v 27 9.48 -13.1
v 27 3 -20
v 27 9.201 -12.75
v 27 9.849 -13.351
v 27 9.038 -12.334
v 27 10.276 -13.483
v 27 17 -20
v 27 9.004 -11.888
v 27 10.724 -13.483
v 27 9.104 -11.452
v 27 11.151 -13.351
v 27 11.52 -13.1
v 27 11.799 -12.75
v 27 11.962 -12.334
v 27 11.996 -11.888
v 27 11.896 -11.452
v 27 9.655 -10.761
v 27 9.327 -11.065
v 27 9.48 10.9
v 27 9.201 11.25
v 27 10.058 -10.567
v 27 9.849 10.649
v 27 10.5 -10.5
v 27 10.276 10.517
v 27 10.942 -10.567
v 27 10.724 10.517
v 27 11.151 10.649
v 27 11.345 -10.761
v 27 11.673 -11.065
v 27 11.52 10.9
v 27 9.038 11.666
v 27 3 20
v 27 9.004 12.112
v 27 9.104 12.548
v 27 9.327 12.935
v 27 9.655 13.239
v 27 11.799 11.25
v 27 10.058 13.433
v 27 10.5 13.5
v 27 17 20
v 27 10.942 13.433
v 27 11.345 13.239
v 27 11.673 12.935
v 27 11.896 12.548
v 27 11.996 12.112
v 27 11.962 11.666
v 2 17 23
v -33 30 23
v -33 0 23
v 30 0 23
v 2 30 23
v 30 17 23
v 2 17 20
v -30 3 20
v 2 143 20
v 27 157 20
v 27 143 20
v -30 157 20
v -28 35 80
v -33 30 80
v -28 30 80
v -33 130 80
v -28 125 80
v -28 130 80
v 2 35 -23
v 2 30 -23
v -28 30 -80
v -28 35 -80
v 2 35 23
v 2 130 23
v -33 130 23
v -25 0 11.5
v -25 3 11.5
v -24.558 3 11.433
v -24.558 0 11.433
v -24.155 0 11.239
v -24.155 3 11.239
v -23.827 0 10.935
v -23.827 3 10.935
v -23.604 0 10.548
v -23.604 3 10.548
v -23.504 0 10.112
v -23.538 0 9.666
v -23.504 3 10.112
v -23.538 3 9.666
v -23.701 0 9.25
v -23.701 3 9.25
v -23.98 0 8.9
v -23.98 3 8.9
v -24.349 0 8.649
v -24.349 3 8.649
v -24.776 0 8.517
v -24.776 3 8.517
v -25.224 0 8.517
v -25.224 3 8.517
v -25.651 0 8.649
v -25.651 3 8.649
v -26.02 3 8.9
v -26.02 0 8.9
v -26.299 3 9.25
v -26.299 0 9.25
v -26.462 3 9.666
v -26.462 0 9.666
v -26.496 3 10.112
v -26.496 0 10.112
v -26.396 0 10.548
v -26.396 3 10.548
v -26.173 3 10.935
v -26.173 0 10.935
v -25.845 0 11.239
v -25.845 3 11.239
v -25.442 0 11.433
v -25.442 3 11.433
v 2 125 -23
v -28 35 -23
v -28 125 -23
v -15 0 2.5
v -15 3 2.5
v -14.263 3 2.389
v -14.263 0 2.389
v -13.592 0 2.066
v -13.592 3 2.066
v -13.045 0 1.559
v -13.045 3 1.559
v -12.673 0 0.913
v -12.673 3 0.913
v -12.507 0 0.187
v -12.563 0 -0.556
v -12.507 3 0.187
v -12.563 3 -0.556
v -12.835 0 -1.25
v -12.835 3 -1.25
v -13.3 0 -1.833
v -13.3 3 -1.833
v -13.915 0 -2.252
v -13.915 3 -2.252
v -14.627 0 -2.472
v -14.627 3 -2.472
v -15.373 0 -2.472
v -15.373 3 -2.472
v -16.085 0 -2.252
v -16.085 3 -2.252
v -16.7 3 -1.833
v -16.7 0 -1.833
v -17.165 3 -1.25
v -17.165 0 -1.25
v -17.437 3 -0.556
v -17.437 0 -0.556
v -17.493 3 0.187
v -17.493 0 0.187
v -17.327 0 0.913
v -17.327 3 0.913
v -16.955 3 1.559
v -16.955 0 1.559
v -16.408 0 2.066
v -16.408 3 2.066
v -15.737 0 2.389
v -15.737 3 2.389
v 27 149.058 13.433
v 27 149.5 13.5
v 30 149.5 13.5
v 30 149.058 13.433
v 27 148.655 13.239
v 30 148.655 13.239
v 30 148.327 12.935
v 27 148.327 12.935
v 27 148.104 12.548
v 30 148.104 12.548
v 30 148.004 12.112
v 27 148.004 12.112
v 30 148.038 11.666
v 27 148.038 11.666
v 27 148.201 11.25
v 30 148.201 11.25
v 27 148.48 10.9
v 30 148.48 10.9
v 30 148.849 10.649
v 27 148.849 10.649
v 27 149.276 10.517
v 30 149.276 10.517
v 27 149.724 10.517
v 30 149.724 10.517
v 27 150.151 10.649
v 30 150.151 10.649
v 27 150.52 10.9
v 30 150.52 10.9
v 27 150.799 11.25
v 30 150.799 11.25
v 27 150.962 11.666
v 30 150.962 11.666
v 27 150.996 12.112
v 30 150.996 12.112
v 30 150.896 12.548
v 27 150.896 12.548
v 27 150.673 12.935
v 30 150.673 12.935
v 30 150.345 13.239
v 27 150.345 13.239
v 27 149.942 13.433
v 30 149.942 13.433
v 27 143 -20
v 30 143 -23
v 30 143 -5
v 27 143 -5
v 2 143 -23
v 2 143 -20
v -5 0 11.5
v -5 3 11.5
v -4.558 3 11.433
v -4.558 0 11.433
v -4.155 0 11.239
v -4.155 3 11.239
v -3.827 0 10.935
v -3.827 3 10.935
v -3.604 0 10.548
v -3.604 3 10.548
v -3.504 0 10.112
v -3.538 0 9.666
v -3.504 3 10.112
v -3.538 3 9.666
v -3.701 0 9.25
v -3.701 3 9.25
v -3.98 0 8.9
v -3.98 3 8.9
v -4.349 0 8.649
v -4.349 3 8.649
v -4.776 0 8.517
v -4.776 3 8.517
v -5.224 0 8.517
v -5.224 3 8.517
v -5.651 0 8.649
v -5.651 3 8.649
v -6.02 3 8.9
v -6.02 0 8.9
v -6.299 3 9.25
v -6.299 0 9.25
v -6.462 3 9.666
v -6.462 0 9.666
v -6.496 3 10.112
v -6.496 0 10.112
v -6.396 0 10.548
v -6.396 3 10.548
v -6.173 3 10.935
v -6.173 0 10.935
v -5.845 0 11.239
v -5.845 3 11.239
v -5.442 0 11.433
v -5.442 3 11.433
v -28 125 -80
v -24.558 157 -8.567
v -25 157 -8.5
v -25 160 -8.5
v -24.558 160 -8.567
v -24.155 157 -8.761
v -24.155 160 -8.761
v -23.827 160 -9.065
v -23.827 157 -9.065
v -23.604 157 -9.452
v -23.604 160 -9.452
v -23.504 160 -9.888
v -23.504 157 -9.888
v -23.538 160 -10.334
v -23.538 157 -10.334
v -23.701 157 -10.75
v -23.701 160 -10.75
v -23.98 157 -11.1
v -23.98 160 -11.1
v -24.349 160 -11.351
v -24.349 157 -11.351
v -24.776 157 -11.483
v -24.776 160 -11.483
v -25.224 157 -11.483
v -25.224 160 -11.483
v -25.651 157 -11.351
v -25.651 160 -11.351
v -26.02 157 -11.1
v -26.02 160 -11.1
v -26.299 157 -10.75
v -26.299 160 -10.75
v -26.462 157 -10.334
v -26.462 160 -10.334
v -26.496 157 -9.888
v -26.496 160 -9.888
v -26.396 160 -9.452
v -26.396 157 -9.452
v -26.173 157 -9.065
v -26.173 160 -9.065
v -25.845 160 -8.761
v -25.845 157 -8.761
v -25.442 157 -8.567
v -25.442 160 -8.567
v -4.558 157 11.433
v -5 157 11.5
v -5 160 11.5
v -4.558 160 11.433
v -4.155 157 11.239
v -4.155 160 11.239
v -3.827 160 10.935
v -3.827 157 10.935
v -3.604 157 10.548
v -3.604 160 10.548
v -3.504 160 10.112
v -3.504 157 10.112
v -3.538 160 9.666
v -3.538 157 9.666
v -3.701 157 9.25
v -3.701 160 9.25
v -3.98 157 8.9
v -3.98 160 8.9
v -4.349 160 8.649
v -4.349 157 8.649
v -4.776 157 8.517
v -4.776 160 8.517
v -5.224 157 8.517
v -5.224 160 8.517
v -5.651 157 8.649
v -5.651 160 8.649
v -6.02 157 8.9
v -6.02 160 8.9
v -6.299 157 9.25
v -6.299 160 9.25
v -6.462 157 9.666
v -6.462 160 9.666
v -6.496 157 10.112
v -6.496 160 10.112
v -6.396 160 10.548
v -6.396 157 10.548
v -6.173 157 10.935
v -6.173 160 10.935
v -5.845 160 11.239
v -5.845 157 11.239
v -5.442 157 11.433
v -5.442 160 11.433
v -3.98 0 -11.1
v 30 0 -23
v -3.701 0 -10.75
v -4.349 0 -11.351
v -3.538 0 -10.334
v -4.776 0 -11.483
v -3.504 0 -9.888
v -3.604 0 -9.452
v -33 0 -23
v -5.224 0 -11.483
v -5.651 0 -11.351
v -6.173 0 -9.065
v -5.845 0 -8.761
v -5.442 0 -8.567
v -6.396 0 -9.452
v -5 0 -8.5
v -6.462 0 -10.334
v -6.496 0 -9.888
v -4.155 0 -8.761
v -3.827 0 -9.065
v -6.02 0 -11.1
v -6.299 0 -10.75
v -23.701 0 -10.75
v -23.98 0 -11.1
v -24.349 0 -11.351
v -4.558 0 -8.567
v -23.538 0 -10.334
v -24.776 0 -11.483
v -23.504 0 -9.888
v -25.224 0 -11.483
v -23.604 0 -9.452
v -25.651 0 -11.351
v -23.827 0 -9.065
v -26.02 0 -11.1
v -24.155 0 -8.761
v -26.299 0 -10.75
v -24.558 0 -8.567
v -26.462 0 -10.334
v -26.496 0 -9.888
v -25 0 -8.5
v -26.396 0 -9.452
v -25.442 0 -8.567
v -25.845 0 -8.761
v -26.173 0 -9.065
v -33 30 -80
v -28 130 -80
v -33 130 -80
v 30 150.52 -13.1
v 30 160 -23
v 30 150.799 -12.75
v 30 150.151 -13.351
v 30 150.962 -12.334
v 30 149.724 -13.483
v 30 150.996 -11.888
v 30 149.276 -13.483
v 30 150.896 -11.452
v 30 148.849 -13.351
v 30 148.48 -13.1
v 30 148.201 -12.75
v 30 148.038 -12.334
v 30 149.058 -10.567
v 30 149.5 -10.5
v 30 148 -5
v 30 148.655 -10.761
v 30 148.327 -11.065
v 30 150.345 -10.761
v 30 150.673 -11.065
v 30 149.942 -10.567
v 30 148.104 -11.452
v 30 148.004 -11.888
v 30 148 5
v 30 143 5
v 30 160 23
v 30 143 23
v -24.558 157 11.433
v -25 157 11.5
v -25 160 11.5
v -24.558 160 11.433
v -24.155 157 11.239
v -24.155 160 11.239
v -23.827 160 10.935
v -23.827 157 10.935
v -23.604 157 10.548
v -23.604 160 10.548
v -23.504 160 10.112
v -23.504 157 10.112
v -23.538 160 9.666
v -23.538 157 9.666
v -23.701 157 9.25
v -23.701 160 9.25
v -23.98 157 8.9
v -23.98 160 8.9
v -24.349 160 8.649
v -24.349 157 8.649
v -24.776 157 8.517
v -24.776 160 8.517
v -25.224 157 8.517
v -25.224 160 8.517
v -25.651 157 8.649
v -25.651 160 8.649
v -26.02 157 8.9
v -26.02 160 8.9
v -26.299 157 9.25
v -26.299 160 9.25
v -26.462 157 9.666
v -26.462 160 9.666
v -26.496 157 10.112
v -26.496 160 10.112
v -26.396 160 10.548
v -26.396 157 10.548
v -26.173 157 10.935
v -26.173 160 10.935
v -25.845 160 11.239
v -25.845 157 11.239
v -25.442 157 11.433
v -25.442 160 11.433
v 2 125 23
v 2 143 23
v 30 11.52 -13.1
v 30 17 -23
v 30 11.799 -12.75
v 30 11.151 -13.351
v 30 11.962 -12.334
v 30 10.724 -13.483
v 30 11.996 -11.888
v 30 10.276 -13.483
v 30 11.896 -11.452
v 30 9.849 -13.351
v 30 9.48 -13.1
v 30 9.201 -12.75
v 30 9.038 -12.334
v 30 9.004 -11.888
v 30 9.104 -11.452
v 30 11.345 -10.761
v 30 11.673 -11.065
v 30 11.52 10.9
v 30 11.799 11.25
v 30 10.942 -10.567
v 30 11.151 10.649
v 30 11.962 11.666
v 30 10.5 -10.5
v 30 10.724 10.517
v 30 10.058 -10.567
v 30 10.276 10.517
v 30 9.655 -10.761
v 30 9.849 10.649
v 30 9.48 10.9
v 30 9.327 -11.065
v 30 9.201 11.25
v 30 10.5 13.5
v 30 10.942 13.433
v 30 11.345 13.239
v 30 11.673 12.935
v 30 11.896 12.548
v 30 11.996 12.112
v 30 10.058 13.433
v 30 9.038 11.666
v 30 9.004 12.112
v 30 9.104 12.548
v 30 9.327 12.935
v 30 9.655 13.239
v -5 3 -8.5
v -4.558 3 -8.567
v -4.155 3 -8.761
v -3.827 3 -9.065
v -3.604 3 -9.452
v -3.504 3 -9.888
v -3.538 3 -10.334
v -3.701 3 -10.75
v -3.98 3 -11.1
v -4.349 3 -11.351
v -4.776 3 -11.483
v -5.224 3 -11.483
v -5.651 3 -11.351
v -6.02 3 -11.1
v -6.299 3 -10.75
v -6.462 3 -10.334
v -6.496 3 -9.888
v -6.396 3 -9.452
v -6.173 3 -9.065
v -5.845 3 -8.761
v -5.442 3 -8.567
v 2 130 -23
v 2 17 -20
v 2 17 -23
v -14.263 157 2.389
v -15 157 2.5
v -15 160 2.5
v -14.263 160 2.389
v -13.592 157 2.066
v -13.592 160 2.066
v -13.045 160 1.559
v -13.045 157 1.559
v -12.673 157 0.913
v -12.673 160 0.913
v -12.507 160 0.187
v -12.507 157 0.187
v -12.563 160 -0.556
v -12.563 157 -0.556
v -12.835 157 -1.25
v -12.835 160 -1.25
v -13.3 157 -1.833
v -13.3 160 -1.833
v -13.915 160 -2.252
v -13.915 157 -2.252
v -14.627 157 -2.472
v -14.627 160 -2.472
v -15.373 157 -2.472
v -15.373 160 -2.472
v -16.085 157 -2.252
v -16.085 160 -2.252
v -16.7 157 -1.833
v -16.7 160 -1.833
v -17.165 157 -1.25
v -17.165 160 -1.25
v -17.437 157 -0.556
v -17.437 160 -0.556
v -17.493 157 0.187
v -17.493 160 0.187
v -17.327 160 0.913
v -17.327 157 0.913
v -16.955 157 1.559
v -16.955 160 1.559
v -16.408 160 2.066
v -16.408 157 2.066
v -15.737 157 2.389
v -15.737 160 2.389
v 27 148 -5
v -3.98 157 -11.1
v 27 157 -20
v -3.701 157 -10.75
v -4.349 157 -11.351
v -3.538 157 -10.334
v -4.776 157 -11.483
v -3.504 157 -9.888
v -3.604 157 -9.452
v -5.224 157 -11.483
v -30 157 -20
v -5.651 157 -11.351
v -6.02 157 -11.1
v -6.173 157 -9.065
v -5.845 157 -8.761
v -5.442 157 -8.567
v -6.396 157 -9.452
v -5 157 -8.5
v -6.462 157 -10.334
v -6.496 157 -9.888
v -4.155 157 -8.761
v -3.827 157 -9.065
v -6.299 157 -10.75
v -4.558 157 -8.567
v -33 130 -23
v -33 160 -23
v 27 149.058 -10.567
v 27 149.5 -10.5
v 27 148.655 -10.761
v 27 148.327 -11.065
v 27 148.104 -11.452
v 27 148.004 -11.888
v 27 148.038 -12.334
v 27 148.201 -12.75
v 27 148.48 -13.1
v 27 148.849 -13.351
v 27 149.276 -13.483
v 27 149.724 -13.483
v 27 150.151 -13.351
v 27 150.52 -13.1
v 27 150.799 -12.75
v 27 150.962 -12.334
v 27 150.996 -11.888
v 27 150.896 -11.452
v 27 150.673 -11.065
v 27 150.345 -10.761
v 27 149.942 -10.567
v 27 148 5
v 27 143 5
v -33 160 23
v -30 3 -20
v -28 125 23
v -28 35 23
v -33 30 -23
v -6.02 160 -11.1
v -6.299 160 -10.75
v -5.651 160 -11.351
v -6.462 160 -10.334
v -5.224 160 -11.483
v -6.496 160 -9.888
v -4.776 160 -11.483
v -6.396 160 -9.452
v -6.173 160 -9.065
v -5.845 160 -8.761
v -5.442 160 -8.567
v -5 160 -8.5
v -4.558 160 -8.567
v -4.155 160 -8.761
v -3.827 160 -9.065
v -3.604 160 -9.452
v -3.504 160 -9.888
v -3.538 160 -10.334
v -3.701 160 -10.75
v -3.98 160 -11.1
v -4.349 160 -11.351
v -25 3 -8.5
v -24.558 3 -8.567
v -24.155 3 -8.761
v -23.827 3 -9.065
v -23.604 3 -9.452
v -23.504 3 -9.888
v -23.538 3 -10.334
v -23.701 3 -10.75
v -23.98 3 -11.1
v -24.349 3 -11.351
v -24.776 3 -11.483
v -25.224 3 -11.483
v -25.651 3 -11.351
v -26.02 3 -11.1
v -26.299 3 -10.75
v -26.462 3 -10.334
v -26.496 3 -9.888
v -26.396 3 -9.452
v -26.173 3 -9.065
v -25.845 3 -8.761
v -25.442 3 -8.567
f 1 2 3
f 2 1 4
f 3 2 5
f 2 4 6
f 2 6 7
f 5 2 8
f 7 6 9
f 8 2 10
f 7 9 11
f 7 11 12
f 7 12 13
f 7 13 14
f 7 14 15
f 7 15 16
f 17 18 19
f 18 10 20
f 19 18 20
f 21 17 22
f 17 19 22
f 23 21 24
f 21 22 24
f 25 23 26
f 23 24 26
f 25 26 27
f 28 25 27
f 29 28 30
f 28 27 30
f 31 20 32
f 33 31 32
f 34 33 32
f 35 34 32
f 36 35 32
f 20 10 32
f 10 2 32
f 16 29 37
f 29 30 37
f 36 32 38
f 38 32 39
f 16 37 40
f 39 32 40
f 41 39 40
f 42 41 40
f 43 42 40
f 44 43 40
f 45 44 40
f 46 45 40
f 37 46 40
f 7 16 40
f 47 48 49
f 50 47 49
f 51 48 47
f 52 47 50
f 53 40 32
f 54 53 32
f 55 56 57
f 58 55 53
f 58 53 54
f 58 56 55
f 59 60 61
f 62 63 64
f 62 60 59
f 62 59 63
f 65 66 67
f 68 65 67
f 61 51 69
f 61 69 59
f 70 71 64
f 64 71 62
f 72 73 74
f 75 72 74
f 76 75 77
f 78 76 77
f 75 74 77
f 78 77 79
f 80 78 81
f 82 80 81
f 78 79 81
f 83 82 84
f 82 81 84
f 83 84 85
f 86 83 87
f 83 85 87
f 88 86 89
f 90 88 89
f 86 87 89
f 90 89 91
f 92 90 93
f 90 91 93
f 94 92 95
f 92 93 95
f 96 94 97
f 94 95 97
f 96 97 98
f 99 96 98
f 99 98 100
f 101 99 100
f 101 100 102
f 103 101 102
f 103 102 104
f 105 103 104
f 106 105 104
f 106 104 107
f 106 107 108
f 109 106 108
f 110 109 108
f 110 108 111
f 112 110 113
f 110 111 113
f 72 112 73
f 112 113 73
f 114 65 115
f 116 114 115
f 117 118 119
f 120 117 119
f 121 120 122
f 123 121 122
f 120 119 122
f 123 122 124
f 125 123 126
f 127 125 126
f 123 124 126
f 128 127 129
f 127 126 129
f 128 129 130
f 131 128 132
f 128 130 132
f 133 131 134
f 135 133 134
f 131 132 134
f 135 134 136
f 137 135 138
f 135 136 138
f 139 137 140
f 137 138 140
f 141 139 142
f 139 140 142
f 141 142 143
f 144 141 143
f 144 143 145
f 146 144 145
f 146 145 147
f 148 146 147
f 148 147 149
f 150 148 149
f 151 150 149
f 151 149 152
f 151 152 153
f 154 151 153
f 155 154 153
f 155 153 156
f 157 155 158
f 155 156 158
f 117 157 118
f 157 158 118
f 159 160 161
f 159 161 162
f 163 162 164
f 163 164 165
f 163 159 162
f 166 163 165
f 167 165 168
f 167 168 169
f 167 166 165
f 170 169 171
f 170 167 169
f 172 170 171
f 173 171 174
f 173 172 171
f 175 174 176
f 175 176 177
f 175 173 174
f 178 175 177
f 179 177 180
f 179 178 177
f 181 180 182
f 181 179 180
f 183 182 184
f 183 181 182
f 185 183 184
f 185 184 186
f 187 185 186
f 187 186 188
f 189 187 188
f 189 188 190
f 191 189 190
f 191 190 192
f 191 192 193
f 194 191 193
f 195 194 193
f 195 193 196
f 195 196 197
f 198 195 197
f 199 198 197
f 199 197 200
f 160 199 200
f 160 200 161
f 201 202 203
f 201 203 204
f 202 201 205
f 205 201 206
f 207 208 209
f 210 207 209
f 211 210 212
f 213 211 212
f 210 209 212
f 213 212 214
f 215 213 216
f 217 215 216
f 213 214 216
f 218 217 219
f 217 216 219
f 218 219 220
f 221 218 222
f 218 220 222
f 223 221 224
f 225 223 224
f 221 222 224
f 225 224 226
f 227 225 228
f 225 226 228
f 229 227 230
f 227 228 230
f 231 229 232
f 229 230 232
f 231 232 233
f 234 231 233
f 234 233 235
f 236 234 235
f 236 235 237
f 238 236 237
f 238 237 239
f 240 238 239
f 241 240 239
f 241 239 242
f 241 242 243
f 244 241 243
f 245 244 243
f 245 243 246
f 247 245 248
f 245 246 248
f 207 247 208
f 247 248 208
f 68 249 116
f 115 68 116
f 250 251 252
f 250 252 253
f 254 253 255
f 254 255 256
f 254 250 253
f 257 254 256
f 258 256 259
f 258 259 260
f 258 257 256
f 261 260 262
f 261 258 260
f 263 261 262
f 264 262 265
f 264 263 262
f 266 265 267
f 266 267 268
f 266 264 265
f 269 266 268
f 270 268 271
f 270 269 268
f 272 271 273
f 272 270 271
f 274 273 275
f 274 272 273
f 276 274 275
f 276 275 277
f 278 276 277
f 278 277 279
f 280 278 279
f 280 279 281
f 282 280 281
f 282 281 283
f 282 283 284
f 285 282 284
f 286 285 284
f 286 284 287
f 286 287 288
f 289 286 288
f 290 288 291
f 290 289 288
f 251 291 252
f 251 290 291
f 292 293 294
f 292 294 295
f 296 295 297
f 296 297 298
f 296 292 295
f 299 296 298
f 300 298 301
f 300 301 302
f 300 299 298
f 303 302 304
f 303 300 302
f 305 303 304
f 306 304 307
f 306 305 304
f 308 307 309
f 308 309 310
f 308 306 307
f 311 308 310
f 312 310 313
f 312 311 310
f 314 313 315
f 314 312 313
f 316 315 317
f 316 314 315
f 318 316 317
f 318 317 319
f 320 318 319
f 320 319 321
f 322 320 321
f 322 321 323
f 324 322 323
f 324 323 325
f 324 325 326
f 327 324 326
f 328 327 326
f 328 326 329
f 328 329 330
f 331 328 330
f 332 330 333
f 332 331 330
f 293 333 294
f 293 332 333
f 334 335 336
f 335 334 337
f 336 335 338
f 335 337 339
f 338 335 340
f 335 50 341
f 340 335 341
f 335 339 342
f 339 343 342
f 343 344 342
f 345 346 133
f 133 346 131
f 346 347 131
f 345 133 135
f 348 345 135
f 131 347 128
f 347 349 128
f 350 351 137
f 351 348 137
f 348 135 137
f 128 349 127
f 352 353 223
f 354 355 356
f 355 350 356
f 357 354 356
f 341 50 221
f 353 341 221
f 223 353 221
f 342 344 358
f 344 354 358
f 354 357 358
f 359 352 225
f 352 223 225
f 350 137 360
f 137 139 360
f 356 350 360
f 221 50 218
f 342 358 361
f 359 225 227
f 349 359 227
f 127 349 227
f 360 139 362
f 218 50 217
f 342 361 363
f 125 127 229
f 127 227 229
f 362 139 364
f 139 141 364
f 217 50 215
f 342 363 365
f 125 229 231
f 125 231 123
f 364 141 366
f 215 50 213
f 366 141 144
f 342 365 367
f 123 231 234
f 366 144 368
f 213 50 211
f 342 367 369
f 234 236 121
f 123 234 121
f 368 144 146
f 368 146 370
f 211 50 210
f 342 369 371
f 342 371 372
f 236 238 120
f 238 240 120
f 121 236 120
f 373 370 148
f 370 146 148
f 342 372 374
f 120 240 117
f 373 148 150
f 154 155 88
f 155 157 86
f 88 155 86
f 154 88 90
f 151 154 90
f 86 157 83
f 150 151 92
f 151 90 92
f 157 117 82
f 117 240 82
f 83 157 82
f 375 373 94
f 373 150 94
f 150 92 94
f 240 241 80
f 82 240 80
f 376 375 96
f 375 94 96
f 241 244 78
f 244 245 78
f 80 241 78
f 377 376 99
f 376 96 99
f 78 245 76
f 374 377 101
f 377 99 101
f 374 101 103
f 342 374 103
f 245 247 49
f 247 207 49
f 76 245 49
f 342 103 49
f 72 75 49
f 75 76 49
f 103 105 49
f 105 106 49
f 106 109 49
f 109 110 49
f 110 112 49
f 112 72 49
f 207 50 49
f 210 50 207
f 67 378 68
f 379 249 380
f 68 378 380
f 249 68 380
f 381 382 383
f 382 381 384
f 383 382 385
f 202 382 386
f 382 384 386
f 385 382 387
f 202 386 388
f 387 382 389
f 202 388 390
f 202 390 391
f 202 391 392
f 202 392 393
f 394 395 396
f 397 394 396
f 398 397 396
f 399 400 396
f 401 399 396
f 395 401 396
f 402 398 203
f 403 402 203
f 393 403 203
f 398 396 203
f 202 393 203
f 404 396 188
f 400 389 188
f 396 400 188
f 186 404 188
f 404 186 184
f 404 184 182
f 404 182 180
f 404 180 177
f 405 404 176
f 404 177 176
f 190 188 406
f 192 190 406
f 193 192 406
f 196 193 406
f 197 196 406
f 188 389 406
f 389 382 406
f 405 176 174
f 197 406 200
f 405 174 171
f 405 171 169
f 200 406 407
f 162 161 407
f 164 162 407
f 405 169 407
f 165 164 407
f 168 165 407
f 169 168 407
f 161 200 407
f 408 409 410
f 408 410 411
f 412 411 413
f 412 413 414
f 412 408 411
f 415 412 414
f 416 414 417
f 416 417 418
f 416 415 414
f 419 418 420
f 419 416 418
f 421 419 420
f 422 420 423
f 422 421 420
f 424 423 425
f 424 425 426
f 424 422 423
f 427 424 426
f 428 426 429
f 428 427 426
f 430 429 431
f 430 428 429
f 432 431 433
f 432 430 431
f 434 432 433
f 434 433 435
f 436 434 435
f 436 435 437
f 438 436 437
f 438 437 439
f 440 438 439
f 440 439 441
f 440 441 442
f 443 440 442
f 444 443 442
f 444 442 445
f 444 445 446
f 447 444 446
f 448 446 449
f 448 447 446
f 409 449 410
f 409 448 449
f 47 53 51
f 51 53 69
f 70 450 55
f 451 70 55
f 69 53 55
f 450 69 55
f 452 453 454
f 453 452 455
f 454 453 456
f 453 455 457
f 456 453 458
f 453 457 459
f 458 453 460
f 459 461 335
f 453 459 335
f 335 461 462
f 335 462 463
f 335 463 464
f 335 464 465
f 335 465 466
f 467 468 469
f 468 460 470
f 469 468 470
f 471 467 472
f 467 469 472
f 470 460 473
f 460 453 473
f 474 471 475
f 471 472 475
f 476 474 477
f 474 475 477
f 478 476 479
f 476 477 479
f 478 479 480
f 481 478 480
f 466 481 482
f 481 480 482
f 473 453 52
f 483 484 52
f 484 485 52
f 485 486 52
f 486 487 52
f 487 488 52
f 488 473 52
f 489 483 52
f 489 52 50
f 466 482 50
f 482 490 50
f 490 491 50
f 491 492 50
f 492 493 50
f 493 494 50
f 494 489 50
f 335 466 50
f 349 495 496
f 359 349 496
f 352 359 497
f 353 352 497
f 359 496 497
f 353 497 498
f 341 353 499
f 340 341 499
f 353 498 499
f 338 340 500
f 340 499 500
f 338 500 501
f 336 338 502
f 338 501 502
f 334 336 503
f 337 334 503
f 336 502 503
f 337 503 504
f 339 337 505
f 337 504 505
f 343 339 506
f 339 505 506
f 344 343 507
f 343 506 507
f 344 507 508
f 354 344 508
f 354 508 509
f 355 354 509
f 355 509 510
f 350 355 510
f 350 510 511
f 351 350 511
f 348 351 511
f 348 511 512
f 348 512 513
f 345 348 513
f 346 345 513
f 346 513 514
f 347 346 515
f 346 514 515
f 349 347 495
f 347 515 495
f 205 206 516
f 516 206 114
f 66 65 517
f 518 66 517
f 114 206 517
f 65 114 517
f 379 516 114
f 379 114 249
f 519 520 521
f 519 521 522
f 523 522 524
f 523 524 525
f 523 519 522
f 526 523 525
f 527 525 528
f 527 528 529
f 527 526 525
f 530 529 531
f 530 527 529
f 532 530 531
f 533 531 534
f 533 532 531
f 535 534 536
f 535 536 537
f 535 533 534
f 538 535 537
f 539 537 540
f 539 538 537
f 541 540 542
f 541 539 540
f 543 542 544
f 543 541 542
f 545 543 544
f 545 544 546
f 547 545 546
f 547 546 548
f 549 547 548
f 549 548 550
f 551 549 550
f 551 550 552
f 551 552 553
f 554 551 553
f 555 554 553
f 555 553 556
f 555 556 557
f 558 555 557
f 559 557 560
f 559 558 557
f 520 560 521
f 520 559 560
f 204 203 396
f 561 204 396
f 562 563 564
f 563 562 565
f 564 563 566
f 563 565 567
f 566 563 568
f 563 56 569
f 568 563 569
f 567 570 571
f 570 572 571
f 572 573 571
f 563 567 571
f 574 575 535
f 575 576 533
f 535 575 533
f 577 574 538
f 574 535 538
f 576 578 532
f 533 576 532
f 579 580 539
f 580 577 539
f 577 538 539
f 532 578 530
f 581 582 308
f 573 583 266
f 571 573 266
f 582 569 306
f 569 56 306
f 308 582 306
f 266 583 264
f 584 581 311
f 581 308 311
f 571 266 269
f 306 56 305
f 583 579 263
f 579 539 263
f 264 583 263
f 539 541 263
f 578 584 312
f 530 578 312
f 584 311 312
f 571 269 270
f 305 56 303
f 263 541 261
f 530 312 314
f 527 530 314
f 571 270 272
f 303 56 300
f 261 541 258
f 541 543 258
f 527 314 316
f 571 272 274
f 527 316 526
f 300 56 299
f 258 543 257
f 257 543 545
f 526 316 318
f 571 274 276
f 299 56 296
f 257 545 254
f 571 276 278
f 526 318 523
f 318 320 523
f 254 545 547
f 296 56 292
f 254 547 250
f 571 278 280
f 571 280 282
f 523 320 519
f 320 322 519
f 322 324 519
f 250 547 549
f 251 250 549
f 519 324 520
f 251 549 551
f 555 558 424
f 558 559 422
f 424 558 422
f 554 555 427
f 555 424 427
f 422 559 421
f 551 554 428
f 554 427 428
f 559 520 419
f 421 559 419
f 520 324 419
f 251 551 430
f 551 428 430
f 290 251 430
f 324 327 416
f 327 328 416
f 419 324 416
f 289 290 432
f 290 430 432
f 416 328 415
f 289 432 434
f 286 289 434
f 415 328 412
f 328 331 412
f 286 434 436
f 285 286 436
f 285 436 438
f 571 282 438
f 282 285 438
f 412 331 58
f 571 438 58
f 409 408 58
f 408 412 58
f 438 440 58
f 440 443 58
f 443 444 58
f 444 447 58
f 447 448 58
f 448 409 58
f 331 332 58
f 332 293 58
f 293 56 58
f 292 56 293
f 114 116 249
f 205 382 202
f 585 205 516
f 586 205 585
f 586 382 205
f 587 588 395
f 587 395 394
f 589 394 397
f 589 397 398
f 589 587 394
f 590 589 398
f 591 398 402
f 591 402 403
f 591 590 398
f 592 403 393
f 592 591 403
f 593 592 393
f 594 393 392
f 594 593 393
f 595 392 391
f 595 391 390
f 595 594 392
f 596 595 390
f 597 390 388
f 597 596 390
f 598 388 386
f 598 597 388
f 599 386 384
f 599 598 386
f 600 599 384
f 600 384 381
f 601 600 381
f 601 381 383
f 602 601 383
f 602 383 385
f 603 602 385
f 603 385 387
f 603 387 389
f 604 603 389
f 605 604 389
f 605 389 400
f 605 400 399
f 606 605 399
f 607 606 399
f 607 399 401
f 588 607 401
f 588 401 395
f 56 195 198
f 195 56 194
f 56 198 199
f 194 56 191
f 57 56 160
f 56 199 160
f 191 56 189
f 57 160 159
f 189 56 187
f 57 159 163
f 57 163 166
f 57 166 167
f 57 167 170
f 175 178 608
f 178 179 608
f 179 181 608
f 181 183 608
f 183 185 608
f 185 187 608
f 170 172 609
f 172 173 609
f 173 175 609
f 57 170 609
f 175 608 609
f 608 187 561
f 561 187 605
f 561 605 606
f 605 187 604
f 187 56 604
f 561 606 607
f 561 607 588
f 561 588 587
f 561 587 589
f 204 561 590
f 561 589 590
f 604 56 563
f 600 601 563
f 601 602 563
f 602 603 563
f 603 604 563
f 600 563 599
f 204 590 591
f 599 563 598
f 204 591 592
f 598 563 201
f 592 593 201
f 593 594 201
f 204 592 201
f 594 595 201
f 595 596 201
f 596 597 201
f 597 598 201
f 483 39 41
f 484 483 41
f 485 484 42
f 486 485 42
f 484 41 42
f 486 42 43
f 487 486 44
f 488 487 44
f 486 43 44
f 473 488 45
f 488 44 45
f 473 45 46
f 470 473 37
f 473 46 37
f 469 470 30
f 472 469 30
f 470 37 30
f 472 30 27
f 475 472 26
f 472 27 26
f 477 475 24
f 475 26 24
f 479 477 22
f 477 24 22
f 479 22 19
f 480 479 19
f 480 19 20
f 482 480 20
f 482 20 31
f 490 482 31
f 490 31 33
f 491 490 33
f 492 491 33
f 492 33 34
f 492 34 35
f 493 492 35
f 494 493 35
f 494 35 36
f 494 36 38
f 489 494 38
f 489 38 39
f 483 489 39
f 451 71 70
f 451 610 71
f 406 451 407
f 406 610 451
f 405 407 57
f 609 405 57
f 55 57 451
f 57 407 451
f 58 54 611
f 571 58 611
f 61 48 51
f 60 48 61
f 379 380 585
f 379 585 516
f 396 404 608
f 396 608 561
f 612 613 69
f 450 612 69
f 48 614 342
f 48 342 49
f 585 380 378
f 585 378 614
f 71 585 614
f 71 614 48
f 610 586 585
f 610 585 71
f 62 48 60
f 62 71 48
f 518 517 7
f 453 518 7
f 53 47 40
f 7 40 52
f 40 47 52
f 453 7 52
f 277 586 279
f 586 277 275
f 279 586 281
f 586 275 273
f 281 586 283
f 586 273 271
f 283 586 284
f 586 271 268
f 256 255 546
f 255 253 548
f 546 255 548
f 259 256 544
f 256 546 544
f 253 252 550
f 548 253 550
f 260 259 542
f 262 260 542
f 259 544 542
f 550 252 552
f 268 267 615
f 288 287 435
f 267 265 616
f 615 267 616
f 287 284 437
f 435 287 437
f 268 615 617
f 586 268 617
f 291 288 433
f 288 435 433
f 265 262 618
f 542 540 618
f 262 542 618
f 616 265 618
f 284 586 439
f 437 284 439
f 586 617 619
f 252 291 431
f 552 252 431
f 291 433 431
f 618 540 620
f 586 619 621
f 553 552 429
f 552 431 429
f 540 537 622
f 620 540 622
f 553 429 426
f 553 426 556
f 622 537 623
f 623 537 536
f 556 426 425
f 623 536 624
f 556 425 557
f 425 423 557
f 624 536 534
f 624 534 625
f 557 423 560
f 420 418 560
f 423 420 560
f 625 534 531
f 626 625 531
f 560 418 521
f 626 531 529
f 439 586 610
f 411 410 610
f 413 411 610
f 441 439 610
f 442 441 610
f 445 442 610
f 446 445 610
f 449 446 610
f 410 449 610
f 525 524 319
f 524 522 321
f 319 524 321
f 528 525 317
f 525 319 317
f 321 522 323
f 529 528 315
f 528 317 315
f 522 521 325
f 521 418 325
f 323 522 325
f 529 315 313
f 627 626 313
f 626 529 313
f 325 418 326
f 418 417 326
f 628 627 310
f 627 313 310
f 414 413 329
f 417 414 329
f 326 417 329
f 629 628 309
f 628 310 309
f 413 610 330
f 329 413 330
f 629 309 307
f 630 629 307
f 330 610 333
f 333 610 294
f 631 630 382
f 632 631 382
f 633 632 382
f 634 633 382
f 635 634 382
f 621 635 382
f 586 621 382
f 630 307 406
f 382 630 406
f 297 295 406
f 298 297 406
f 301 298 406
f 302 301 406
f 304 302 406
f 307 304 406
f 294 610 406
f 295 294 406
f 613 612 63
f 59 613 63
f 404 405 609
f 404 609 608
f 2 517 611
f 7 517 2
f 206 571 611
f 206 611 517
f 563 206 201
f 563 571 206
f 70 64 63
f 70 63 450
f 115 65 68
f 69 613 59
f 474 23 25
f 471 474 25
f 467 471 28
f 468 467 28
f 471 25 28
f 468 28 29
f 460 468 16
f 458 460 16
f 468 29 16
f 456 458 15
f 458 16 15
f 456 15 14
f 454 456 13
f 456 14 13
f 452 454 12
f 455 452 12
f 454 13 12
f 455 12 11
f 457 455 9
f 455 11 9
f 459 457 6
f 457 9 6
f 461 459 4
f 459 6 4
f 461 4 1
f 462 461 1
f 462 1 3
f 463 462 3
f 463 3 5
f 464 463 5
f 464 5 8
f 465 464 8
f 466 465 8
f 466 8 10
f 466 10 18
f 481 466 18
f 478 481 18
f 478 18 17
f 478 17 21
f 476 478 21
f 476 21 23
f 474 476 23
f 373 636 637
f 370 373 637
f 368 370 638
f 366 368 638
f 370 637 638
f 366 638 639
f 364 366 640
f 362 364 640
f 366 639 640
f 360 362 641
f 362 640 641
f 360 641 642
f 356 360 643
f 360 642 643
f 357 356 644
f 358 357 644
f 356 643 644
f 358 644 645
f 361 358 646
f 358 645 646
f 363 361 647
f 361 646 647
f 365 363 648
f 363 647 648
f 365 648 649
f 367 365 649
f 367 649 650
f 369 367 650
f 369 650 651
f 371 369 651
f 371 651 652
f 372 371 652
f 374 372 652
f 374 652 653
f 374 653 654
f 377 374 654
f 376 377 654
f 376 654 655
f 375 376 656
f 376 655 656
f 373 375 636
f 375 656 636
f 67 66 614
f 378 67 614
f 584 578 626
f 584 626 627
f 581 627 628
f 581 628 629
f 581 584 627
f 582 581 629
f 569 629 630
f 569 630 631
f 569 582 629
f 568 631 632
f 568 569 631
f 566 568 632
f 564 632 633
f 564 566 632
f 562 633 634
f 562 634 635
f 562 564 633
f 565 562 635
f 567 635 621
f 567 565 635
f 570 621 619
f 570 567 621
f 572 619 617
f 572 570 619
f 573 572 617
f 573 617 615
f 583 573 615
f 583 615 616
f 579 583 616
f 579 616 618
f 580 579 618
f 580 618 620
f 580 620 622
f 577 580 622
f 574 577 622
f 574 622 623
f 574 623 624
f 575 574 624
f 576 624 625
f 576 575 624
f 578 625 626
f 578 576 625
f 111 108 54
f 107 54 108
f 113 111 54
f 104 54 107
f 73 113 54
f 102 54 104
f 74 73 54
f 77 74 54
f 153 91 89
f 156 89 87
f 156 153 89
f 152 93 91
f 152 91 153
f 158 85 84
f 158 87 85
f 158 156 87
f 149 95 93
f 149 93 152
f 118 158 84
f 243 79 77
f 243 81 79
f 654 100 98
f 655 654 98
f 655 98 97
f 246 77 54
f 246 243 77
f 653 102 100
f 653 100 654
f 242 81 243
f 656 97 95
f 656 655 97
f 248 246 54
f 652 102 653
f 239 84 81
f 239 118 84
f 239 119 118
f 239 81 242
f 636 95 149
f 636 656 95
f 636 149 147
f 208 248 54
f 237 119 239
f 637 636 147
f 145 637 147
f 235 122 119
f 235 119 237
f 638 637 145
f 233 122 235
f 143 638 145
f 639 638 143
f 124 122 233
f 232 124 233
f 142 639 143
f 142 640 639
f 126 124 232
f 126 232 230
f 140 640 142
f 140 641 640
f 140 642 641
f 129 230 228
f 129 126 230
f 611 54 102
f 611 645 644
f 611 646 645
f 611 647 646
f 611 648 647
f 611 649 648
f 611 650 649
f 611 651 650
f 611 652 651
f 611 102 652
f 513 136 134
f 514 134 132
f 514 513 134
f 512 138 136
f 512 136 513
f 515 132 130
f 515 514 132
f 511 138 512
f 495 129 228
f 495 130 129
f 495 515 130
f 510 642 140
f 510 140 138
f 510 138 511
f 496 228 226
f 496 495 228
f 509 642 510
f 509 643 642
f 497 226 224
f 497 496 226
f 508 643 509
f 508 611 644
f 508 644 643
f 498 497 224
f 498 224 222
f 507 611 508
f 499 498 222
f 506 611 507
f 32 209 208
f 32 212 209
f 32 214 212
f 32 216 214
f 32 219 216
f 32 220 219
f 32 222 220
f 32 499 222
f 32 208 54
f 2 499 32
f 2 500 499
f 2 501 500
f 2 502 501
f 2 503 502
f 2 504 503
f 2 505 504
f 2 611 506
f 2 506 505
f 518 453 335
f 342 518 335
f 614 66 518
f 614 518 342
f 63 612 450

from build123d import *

# Parameters (mm, degrees)
SKETCH1_W       = 60
SKETCH1_H       = 40
EXTRUDE1_DEPTH  = 3
SKETCH2_W       = 3
SKETCH2_H       = 40
EXTRUDE2_DEPTH  = 14
SKETCH4_R       = 1.5
EXTRUDE3_DEPTH  = 15
SKETCH5_W       = 57
SKETCH5_H       = 14
EXTRUDE4_DEPTH  = 3
SKETCH6_W       = 57
SKETCH6_H       = 14
EXTRUDE5_DEPTH  = 3
SKETCH7_R       = 1.5
EXTRUDE6_DEPTH  = 3
SKETCH8_R       = 2.5
EXTRUDE7_DEPTH  = 3
SKETCH9_W       = 40
SKETCH9_H       = 17
EXTRUDE8_DEPTH  = 3
EXTRUDE9_DEPTH  = 63
EXTRUDE10_DEPTH = 3
EXTRUDE11_DEPTH = 3
EXTRUDE12_DEPTH = 3
EXTRUDE13_DEPTH = 3
SKETCH15_W      = 160
SKETCH15_H      = 100
EXTRUDE14_DEPTH = 5
EXTRUDE15_DEPTH = 5
EXTRUDE16_DEPTH = 5
SKETCH18_W      = 40
SKETCH18_H      = 100
EXTRUDE17_DEPTH = 2
SKETCH19_W      = 10
SKETCH19_H      = 10
EXTRUDE18_DEPTH = 5


with BuildPart() as part:
    # Sketch1 → Extrude1 (new body)
    with BuildSketch(Plane(origin=(0, 0, 0), x_dir=(1, 0, 0), z_dir=(0, 1, 0))):
        Rectangle(SKETCH1_W, SKETCH1_H)
    extrude(amount=EXTRUDE1_DEPTH)

    # Sketch2 → Extrude2 (add)
    with BuildSketch(Plane(origin=(0, 3, 0), x_dir=(1, 0, 0), z_dir=(0, 1, 0))):
        with Locations((28.5, 0)):
            Rectangle(SKETCH2_W, SKETCH2_H)
    extrude(amount=EXTRUDE2_DEPTH)

    # Sketch4 → Extrude3 (cut)
    with BuildSketch(Plane.ZY.offset(-27)):
        with Locations((-12, 10.5)):
            Circle(SKETCH4_R)
        with Locations((12, 10.5)):
            Circle(SKETCH4_R)
    extrude(amount=-EXTRUDE3_DEPTH, mode=Mode.SUBTRACT)

    # Sketch5 → Extrude4 (add)
    with BuildSketch(Plane(origin=(0, 0, -20), x_dir=(-1, 0, 0), z_dir=(0, 0, -1))):
        with Locations((1.5, 10)):
            Rectangle(SKETCH5_W, SKETCH5_H)
    extrude(amount=-EXTRUDE4_DEPTH)

    # Sketch6 → Extrude5 (add)
    with BuildSketch(Plane.XY.offset(20)):
        with Locations((-1.5, 10)):
            Rectangle(SKETCH6_W, SKETCH6_H)
    extrude(amount=-EXTRUDE5_DEPTH)

    # Sketch7 → Extrude6 (cut)
    with BuildSketch(Plane(origin=(0, 3, 0), x_dir=(1, 0, 0), z_dir=(0, 1, 0))):
        with Locations(Location((-5, 10, 0), (0, 0, 270))):
            Circle(SKETCH7_R)
        with Locations(Location((-25, 10, 0), (0, 0, 270))):
            Circle(SKETCH7_R)
        with Locations(Location((-25, -10, 0), (0, 0, 270))):
            Circle(SKETCH7_R)
        with Locations(Location((-5, -10, 0), (0, 0, 270))):
            Circle(SKETCH7_R)
    extrude(amount=-EXTRUDE6_DEPTH, mode=Mode.SUBTRACT)

    # Sketch8 → Extrude7 (cut)
    with BuildSketch(Plane(origin=(0, 3, 0), x_dir=(1, 0, 0), z_dir=(0, 1, 0))):
        with Locations(Location((-15, 0, 0), (0, 0, 270))):
            Circle(SKETCH8_R)
    extrude(amount=-EXTRUDE7_DEPTH, mode=Mode.SUBTRACT)

    # Sketch9 → Extrude8 (add)
    with BuildSketch(Plane.ZY.offset(30)):
        with Locations((0, 8.5)):
            Rectangle(SKETCH9_W, SKETCH9_H)
    extrude(amount=EXTRUDE8_DEPTH)

    # Sketch10 → Extrude9 (add)
    with BuildSketch(Plane(origin=(0, 17, 0), x_dir=(1, 0, 0), z_dir=(0, 1, 0))):
        Polygon((-30, -17), (-30, 17), (2, 17), (2, 20), (-33, 20), (-33, -20), (2, -20), (2, -17), align=None)
    extrude(amount=EXTRUDE9_DEPTH)

    # Mirror2: part across plane


with BuildPart() as part_1:
    add(part.part)
    add(part.part.mirror(Plane.ZX.offset(80)))

    # Sketch11 → Extrude10 (add)
    with BuildSketch(Plane.XY.offset(20)):
        Polygon((-33, 0), (30, 0), (30, 17), (2, 17), (2, 143), (30, 143), (30, 160), (-33, 160), align=None)
    extrude(amount=EXTRUDE10_DEPTH)

    # Sketch12 → Extrude11 (add)
    with BuildSketch(Plane(origin=(0, 0, -20), x_dir=(-1, 0, 0), z_dir=(0, 0, -1))):
        Polygon((-30, 0), (33, 0), (33, 160), (-30, 160), (-30, 143), (-2, 143), (-2, 17), (-30, 17), align=None)
    extrude(amount=EXTRUDE11_DEPTH)

    # Sketch13 → Extrude12 (cut)
    with BuildSketch(Plane(origin=(0, 0, 17), x_dir=(-1, 0, 0), z_dir=(0, 0, -1))):
        Polygon((-27, 17), (-27, 3), (30, 3), (30, 157), (-27, 157), (-27, 143), (-2, 143), (-2, 17), align=None)
    extrude(amount=-EXTRUDE12_DEPTH, mode=Mode.SUBTRACT)

    # Sketch14 → Extrude13 (cut)
    with BuildSketch(Plane.XY.offset(-17)):
        Polygon((27, 17), (2, 17), (2, 143), (27, 143), (27, 157), (-30, 157), (-30, 3), (27, 3), align=None)
    extrude(amount=-EXTRUDE13_DEPTH, mode=Mode.SUBTRACT)

    # Sketch15 → Extrude14 (add)
    with BuildSketch(Plane.ZY.offset(33)):
        with Locations((0, 80)):
            Rectangle(SKETCH15_W, SKETCH15_H)
    extrude(amount=-EXTRUDE14_DEPTH)

    # Sketch16 → Extrude15 (add)
    with BuildSketch(Plane.XZ.offset(-30)):
        Polygon((-28, -23), (2, -23), (-28, -80), align=None)
        Polygon((-28, 23), (2, 23), (-28, 80), align=None)
    extrude(amount=-EXTRUDE15_DEPTH)

    # Sketch17 → Extrude16 (add)
    with BuildSketch(Plane(origin=(0, 130, 0), x_dir=(1, 0, 0), z_dir=(0, 1, 0))):
        Polygon((-28, 80), (-28, 23), (2, 23), align=None)
        Polygon((-28, -23), (-28, -80), (2, -23), align=None)
    extrude(amount=-EXTRUDE16_DEPTH)

    # Sketch18 → Extrude17 (cut)
    with BuildSketch(Plane(origin=(-28, 0, 0), x_dir=(0, 0, -1), z_dir=(1, 0, 0))):
        with Locations((0, 80)):
            Rectangle(SKETCH18_W, SKETCH18_H)
    extrude(amount=-EXTRUDE17_DEPTH, mode=Mode.SUBTRACT)

    # Sketch19 → Extrude18 (cut)
    with BuildSketch(Plane(origin=(30, 0, 0), x_dir=(0, 0, -1), z_dir=(1, 0, 0))):
        with Locations((0, 143)):
            Rectangle(SKETCH19_W, SKETCH19_H)
    extrude(amount=-EXTRUDE18_DEPTH, mode=Mode.SUBTRACT)


solid = part_1.part
